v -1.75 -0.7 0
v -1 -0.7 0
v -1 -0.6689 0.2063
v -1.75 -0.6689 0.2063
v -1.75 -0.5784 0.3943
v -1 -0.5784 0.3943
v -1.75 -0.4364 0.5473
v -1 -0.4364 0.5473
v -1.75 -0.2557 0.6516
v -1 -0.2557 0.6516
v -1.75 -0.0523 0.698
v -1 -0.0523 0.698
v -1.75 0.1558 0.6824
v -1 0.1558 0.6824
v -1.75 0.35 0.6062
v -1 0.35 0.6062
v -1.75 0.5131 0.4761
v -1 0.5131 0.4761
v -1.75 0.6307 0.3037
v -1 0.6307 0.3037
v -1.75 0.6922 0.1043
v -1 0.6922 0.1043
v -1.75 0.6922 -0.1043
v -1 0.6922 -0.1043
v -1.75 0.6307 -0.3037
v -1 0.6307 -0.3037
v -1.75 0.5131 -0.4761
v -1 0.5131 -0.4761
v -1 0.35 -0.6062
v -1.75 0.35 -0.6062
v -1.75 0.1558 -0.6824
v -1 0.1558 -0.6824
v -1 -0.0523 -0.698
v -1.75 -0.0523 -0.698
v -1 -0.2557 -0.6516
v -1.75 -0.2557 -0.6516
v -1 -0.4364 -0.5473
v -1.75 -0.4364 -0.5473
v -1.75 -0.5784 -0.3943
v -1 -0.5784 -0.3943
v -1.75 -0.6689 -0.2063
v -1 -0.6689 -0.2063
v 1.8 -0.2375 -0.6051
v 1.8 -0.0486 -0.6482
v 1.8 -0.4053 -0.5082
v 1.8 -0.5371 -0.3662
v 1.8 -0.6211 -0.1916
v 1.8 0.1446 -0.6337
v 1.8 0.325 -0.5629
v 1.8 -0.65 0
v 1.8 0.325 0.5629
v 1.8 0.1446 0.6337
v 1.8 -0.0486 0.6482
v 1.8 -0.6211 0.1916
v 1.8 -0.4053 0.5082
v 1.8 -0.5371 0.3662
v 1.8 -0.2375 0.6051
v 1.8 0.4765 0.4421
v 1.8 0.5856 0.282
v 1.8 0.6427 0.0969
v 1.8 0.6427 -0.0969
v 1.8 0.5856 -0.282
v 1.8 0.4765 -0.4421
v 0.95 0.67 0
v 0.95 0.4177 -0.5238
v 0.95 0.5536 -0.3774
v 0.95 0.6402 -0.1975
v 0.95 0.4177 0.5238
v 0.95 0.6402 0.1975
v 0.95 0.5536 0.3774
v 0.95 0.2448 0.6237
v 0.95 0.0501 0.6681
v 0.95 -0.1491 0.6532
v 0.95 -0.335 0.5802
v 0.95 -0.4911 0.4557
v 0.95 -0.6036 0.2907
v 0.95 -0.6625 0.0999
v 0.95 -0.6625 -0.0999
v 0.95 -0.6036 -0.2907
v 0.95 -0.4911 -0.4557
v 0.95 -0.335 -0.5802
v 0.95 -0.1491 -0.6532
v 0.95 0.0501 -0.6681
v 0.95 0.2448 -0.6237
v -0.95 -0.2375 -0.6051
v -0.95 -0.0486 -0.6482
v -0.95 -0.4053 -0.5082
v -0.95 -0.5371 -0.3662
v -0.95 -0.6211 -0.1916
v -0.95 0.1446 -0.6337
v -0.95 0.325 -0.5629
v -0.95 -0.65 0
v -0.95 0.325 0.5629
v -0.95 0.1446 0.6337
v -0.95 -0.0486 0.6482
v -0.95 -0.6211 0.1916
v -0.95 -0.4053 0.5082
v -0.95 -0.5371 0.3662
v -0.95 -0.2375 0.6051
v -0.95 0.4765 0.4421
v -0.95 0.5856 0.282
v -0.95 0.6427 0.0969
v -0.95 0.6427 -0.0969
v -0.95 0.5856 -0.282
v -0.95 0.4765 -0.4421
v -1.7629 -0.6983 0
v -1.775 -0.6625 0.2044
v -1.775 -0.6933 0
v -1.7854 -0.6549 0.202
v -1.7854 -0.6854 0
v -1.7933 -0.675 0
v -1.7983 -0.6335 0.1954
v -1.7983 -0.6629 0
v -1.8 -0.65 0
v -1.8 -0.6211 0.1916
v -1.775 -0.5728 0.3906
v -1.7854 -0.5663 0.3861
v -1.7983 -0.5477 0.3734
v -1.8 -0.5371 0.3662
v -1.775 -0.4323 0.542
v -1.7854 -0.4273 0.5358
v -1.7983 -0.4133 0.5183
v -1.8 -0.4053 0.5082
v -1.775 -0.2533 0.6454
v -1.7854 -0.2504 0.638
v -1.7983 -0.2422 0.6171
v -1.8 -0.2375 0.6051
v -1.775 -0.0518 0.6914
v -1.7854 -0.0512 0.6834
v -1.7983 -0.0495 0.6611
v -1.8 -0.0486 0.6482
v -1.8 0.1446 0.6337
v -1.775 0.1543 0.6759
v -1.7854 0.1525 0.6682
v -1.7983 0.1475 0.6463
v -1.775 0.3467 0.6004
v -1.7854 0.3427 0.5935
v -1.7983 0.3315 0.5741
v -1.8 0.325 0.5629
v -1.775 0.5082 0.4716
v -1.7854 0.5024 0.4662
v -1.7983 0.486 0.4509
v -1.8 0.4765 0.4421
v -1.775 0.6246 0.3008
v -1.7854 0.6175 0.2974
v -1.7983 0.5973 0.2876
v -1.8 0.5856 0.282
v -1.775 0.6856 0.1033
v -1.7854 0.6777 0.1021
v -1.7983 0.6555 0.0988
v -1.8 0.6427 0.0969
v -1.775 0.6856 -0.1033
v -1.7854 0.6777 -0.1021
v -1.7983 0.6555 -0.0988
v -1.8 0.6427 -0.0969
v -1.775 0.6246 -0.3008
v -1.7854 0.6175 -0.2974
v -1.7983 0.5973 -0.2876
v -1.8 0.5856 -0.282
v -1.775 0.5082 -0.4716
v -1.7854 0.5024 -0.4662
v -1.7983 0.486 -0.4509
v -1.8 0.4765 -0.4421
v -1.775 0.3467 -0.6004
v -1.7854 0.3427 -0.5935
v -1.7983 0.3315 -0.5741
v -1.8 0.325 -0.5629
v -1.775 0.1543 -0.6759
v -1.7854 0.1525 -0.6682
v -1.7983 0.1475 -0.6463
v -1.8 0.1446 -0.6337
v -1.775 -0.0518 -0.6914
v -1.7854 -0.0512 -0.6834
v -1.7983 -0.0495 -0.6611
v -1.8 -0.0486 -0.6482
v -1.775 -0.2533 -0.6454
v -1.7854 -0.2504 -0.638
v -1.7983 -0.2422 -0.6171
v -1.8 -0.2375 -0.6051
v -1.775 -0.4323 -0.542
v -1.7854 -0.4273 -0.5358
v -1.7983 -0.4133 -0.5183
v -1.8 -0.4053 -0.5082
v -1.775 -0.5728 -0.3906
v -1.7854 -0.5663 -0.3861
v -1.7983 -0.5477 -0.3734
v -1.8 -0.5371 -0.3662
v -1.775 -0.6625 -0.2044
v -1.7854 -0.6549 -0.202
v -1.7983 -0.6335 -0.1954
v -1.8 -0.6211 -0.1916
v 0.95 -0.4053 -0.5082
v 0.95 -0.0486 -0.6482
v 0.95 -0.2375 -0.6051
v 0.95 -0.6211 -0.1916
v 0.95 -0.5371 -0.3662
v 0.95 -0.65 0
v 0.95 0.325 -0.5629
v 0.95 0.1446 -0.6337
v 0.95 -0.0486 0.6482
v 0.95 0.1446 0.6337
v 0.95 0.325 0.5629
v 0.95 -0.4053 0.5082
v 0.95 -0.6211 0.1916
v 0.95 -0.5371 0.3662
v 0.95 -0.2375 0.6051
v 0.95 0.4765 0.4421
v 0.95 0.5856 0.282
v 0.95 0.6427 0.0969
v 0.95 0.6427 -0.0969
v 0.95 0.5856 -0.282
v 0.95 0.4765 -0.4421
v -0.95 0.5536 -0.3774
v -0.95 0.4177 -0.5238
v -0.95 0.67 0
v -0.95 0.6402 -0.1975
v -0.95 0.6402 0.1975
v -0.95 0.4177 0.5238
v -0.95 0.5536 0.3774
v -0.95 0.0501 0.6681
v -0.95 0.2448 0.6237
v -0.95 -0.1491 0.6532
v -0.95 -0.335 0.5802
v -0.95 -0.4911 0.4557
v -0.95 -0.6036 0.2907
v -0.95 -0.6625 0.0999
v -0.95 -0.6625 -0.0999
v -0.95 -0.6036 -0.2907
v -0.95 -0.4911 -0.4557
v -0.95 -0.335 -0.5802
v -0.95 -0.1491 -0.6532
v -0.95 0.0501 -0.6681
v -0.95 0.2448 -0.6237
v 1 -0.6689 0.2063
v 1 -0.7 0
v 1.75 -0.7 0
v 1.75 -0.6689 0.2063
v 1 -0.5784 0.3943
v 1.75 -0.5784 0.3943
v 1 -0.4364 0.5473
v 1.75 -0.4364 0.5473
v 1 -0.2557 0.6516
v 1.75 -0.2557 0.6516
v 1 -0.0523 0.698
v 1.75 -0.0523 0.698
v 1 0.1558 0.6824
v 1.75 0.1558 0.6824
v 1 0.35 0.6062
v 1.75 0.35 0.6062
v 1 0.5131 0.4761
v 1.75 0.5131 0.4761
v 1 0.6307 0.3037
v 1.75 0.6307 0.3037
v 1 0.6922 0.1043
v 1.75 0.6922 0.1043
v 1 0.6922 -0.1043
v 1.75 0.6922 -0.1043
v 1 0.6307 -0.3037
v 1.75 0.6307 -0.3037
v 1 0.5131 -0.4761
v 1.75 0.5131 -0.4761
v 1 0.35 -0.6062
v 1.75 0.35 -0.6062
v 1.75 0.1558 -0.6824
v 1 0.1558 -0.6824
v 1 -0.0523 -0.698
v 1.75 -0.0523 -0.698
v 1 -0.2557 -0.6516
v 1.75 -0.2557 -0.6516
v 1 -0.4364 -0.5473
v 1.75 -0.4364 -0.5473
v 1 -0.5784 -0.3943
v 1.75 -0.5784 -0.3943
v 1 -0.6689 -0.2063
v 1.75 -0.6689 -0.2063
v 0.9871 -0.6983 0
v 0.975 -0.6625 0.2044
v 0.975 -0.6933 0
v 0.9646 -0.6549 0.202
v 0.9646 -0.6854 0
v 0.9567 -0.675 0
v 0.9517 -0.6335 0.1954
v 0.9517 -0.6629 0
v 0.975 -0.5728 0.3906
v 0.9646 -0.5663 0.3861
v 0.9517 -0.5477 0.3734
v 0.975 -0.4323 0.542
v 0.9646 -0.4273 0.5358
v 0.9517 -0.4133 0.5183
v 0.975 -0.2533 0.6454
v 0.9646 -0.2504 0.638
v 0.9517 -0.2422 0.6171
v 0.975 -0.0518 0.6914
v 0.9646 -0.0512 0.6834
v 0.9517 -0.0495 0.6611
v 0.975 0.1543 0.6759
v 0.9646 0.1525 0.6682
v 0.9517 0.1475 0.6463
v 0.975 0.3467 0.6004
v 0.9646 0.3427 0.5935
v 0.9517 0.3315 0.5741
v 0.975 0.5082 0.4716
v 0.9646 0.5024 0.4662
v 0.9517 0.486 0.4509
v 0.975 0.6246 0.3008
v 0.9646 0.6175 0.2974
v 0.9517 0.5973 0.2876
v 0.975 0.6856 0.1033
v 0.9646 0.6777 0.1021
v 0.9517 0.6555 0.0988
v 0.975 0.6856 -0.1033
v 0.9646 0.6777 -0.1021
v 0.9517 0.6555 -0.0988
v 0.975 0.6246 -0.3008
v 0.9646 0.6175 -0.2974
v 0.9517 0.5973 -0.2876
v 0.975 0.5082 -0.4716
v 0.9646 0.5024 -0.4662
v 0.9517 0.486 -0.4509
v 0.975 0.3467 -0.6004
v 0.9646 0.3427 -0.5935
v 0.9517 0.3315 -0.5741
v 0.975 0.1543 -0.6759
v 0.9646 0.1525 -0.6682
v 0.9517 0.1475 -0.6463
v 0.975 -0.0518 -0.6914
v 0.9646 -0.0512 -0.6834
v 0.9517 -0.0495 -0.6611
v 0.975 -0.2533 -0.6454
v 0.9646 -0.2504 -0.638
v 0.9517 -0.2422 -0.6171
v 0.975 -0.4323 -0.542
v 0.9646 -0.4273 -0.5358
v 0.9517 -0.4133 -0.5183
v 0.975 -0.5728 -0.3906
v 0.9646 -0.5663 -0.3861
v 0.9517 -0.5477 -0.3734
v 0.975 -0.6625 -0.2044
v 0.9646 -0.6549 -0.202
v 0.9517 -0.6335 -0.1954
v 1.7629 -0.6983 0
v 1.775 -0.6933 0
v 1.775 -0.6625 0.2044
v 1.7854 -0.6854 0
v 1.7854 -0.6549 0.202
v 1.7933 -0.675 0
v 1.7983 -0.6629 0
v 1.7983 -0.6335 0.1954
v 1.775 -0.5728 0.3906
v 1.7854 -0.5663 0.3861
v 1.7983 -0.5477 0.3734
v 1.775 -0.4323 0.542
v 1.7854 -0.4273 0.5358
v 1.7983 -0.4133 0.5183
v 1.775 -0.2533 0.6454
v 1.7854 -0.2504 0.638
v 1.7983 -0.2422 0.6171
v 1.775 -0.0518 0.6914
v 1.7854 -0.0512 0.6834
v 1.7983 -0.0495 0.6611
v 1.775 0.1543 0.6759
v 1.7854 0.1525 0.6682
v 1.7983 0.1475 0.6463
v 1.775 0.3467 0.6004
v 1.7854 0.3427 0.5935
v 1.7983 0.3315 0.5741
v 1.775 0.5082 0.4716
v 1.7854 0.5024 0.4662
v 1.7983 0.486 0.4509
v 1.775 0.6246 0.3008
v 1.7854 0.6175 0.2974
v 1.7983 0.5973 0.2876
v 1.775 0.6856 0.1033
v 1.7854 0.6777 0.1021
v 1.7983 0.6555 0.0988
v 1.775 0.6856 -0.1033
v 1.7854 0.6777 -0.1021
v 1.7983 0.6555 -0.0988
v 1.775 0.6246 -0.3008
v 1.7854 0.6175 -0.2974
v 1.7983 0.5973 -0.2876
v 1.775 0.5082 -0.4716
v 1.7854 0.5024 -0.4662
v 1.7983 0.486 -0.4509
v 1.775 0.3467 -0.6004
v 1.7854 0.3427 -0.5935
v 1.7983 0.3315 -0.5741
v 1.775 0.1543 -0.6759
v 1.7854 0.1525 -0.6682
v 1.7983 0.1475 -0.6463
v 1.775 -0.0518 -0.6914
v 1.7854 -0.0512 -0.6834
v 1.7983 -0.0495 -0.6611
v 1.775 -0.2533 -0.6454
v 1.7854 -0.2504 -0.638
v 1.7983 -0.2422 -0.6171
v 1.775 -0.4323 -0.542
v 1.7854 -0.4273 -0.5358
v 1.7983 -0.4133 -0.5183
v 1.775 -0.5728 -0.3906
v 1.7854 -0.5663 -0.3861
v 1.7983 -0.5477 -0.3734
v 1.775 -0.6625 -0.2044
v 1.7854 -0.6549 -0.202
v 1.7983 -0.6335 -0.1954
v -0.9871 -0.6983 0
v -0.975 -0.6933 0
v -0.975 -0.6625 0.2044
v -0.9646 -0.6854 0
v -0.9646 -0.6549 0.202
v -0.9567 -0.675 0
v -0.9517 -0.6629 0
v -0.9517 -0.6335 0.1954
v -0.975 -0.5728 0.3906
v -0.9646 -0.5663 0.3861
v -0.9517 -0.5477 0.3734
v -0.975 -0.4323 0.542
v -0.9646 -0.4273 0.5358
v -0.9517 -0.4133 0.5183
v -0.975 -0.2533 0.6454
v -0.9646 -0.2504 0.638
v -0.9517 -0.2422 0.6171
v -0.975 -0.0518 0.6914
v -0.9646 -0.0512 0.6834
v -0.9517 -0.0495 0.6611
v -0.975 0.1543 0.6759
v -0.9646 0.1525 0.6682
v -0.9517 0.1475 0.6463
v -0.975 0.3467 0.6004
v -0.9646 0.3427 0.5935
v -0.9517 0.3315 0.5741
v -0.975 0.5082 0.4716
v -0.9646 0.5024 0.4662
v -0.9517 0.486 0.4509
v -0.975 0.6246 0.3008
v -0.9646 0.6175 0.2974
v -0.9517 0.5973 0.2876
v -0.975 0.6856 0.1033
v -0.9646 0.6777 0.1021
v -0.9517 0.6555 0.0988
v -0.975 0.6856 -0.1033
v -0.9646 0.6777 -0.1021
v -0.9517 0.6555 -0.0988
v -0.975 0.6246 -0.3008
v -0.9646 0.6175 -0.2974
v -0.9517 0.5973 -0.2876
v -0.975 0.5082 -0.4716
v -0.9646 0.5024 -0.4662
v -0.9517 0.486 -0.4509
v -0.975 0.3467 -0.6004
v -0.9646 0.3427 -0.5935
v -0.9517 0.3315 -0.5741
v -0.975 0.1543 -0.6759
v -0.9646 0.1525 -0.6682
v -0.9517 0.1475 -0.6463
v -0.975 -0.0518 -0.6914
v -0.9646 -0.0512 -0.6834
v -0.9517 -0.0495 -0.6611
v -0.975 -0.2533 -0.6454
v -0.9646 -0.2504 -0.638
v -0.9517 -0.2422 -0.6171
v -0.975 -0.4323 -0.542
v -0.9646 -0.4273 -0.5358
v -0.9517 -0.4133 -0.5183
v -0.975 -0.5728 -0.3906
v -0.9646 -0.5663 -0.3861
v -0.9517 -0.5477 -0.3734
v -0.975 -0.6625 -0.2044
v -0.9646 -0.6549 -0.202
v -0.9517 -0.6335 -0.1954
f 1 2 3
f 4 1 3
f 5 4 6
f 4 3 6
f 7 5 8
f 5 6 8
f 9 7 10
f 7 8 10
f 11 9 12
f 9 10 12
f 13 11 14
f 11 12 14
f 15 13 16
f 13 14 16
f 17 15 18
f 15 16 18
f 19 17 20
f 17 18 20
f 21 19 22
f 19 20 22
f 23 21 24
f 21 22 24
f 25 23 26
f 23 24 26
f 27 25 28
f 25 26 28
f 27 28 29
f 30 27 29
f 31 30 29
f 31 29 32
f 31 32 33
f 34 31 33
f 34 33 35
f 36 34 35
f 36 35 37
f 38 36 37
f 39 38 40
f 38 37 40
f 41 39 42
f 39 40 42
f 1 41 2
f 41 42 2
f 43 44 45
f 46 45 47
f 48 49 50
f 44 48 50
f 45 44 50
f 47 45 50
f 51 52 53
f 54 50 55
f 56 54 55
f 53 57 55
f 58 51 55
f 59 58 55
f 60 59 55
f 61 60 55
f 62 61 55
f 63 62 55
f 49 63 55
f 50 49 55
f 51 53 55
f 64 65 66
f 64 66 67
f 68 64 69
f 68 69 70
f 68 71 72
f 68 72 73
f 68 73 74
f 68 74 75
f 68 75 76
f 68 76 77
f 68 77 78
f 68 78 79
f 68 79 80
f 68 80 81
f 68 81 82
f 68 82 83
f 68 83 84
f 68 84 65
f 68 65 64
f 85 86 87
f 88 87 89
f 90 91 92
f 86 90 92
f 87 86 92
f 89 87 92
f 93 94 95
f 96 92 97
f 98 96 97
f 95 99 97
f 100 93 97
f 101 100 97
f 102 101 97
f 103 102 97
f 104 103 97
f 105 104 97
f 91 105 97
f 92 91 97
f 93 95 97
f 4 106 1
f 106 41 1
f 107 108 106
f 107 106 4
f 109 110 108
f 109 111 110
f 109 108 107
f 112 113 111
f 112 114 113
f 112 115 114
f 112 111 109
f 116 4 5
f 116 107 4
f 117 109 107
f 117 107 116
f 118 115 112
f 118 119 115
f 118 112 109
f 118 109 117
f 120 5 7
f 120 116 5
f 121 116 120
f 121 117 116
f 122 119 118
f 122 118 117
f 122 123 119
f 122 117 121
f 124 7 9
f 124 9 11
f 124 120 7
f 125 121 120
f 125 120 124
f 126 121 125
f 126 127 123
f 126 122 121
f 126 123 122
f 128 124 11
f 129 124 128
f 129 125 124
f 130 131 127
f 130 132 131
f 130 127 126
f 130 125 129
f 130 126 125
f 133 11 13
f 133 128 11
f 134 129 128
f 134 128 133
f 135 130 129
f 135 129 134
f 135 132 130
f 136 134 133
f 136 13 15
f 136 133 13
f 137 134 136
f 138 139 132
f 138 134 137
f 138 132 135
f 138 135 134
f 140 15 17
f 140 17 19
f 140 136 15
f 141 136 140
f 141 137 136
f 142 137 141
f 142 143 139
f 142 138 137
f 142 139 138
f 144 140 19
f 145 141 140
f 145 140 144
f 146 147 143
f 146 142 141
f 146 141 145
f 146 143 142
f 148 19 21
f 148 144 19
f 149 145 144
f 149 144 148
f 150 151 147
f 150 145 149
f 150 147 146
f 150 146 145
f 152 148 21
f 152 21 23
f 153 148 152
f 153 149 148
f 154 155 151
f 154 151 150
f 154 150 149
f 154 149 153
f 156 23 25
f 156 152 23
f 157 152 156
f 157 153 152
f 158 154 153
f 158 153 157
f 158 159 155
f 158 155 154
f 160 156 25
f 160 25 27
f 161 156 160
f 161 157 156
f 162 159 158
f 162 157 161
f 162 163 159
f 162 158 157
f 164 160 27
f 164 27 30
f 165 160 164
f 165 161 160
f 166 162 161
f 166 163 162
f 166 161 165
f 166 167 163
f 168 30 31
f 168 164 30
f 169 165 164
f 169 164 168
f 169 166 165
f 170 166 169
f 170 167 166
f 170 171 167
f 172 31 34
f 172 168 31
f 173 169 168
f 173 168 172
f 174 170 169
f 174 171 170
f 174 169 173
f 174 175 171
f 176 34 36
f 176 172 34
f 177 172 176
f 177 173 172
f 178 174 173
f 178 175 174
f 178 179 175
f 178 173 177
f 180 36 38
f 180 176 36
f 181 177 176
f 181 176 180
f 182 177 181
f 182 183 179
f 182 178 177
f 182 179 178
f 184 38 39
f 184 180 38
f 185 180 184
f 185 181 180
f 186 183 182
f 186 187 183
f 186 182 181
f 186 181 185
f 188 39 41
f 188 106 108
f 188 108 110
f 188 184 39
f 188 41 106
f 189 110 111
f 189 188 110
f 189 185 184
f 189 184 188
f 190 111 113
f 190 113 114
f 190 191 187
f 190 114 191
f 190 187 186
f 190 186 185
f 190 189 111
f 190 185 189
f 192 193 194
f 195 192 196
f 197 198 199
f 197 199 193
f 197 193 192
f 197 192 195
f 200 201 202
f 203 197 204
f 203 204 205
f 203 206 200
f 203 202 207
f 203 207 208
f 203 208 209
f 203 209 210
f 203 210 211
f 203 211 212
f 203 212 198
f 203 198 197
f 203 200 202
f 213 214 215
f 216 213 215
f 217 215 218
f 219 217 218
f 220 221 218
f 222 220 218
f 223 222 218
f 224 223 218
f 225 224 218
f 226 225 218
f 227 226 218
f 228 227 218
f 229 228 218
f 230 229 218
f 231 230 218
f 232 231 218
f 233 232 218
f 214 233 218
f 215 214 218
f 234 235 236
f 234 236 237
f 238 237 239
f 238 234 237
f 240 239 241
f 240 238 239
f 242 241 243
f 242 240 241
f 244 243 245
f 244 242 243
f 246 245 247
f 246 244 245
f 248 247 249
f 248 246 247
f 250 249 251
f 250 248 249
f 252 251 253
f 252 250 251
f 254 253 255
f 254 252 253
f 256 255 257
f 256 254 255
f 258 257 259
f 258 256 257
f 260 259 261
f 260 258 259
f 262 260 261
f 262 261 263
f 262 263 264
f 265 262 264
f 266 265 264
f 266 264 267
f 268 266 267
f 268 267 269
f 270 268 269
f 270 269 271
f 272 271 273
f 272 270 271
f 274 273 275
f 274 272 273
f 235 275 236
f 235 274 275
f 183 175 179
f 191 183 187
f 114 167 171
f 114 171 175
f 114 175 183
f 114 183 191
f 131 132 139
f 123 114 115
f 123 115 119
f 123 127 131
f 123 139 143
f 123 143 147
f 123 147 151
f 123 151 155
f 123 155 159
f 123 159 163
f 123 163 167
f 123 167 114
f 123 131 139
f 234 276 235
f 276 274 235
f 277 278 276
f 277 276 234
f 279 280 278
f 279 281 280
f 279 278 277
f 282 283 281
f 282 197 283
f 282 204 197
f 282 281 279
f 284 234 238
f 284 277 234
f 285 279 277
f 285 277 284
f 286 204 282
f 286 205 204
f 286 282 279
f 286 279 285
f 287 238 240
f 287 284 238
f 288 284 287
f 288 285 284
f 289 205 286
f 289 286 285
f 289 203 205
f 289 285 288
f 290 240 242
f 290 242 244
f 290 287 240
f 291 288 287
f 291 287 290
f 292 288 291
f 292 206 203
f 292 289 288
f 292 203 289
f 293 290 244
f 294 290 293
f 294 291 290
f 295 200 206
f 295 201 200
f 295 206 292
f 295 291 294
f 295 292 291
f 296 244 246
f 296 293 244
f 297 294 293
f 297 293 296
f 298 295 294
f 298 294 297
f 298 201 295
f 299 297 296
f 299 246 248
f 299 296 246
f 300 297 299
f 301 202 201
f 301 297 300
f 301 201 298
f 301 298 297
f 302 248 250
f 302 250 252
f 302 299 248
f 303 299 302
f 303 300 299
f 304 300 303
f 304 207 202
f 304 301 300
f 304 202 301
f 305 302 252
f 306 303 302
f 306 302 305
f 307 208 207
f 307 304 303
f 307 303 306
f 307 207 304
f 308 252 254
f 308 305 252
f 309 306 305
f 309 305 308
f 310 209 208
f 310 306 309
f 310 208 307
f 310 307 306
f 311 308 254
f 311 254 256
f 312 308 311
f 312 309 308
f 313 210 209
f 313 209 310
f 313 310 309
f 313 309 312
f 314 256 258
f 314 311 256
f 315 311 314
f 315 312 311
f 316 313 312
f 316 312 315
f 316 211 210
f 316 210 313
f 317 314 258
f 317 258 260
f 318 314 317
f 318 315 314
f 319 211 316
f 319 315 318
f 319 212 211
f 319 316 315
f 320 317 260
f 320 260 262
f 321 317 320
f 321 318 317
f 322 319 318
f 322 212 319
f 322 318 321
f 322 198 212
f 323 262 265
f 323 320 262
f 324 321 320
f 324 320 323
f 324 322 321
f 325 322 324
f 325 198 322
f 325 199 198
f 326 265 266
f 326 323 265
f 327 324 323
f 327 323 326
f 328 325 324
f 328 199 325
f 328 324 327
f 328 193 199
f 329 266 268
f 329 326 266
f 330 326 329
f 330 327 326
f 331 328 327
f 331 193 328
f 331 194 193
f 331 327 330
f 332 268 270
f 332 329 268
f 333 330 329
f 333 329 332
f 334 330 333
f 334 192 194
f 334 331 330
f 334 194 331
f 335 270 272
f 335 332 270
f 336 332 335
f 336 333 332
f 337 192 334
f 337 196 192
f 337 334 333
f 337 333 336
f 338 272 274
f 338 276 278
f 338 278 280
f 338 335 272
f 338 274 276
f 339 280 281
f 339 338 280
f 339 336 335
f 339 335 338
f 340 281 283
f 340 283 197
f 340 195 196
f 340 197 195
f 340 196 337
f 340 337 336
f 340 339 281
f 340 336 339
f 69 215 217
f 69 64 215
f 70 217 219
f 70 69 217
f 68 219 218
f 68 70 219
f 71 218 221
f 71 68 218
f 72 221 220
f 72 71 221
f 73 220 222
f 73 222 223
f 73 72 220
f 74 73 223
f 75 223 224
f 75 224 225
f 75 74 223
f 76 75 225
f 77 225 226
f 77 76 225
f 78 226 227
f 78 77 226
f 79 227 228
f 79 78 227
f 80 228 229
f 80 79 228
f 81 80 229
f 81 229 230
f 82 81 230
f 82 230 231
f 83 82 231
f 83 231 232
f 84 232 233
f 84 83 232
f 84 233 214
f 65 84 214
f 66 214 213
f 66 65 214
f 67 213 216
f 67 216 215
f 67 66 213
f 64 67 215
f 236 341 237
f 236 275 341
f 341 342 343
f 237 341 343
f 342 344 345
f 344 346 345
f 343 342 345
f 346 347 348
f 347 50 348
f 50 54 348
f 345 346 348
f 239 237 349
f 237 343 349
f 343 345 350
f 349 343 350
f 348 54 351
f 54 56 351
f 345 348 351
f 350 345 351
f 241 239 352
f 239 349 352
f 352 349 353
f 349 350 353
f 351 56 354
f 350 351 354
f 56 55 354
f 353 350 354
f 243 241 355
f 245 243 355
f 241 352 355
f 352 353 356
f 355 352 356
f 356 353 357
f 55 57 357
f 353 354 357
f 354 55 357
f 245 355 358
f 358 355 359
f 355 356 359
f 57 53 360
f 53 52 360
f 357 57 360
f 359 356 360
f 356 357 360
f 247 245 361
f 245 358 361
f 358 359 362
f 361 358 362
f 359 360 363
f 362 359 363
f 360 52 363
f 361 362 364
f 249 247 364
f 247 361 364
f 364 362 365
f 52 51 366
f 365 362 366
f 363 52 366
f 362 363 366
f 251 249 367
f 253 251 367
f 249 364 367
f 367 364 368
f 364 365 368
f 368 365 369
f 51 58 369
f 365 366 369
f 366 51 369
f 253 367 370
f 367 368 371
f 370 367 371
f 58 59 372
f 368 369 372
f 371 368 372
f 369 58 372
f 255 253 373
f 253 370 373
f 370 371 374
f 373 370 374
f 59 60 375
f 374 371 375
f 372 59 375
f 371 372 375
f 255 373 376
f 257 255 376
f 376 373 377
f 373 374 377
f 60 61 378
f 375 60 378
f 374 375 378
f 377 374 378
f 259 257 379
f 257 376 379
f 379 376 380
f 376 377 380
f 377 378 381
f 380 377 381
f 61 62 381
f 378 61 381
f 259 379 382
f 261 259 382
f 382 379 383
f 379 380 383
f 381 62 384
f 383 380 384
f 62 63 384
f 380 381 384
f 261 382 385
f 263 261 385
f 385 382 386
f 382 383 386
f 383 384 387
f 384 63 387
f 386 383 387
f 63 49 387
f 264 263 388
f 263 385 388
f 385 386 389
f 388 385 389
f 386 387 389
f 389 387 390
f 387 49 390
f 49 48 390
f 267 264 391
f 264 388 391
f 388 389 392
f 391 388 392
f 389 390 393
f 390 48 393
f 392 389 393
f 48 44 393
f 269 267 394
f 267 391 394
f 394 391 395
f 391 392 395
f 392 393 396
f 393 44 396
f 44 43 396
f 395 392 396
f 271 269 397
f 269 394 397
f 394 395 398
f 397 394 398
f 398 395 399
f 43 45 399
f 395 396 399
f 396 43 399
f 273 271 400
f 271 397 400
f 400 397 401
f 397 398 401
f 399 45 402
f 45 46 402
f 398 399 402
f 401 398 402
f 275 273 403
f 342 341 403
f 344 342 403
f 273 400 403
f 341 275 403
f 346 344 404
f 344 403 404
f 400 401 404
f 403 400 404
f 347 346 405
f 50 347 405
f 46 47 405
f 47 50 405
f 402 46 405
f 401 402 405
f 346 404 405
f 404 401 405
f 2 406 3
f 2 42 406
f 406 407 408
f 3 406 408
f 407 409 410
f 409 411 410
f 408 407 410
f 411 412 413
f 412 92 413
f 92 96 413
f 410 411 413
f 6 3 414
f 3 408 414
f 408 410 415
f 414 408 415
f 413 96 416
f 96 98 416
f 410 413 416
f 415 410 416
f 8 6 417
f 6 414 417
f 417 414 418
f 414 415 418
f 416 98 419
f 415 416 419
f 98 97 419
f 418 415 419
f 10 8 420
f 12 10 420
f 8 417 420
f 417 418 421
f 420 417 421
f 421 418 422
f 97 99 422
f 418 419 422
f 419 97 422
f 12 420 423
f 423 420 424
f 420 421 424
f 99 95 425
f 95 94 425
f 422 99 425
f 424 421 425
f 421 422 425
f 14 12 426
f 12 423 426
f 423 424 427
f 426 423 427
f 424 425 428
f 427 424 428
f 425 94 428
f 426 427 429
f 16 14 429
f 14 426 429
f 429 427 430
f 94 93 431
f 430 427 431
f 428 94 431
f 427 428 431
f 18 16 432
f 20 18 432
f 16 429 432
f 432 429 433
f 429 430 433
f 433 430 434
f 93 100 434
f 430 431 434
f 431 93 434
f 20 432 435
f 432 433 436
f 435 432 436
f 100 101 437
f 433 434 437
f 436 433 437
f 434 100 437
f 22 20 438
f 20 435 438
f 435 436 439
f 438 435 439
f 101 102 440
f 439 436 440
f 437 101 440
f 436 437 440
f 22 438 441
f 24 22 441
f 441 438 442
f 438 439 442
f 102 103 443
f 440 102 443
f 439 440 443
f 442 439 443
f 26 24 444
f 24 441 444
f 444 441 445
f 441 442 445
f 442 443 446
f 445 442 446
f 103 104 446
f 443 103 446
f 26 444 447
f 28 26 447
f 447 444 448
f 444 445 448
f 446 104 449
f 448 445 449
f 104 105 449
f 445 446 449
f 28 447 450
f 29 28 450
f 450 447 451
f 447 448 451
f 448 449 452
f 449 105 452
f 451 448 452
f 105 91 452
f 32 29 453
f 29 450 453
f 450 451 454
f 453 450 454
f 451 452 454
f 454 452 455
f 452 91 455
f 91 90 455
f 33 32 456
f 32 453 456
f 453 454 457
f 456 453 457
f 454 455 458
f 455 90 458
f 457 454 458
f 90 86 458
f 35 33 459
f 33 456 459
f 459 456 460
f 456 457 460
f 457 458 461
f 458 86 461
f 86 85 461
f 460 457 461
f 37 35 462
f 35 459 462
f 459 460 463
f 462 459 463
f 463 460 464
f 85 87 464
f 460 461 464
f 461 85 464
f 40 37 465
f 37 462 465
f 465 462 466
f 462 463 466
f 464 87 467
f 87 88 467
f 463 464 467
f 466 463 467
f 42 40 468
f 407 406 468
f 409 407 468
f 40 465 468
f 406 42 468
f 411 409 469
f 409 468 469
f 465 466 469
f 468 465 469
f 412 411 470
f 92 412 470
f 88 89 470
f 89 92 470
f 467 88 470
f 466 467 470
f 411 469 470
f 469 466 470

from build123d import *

# Parameters (mm, degrees)
F0_R     = 0.67
F1_DEPTH = 0.95
F2_R     = 0.7
F3_DEPTH = 0.85
F4_R     = 0.05


with BuildPart() as f1:
    # F0 (on Right) → F1 (new body, symmetric)
    with BuildSketch(Plane.YZ):
        Circle(F0_R)
    extrude(amount=F1_DEPTH, both=True)


with BuildPart() as f3:
    # F2 (on face) → F3 (new body)
    with BuildSketch(Plane(origin=(-0.95, 0, 0), x_dir=(0, -1, 0), z_dir=(-1, 0, 0))):
        Circle(F2_R)
    extrude(amount=F3_DEPTH)

    # F4
    f4_edges = [f3.edges().sort_by_distance(p)[0] for p in [
        (-1.8, 0.7, 0),
        (-0.95, 0.7, 0),
    ]]
    fillet(f4_edges, radius=F4_R)


with BuildPart() as f5_1:
    # F5: instance of F3
    add(f3.part.mirror(Plane.YZ))


solid = Compound([f1.part, f3.part, f5_1.part])
